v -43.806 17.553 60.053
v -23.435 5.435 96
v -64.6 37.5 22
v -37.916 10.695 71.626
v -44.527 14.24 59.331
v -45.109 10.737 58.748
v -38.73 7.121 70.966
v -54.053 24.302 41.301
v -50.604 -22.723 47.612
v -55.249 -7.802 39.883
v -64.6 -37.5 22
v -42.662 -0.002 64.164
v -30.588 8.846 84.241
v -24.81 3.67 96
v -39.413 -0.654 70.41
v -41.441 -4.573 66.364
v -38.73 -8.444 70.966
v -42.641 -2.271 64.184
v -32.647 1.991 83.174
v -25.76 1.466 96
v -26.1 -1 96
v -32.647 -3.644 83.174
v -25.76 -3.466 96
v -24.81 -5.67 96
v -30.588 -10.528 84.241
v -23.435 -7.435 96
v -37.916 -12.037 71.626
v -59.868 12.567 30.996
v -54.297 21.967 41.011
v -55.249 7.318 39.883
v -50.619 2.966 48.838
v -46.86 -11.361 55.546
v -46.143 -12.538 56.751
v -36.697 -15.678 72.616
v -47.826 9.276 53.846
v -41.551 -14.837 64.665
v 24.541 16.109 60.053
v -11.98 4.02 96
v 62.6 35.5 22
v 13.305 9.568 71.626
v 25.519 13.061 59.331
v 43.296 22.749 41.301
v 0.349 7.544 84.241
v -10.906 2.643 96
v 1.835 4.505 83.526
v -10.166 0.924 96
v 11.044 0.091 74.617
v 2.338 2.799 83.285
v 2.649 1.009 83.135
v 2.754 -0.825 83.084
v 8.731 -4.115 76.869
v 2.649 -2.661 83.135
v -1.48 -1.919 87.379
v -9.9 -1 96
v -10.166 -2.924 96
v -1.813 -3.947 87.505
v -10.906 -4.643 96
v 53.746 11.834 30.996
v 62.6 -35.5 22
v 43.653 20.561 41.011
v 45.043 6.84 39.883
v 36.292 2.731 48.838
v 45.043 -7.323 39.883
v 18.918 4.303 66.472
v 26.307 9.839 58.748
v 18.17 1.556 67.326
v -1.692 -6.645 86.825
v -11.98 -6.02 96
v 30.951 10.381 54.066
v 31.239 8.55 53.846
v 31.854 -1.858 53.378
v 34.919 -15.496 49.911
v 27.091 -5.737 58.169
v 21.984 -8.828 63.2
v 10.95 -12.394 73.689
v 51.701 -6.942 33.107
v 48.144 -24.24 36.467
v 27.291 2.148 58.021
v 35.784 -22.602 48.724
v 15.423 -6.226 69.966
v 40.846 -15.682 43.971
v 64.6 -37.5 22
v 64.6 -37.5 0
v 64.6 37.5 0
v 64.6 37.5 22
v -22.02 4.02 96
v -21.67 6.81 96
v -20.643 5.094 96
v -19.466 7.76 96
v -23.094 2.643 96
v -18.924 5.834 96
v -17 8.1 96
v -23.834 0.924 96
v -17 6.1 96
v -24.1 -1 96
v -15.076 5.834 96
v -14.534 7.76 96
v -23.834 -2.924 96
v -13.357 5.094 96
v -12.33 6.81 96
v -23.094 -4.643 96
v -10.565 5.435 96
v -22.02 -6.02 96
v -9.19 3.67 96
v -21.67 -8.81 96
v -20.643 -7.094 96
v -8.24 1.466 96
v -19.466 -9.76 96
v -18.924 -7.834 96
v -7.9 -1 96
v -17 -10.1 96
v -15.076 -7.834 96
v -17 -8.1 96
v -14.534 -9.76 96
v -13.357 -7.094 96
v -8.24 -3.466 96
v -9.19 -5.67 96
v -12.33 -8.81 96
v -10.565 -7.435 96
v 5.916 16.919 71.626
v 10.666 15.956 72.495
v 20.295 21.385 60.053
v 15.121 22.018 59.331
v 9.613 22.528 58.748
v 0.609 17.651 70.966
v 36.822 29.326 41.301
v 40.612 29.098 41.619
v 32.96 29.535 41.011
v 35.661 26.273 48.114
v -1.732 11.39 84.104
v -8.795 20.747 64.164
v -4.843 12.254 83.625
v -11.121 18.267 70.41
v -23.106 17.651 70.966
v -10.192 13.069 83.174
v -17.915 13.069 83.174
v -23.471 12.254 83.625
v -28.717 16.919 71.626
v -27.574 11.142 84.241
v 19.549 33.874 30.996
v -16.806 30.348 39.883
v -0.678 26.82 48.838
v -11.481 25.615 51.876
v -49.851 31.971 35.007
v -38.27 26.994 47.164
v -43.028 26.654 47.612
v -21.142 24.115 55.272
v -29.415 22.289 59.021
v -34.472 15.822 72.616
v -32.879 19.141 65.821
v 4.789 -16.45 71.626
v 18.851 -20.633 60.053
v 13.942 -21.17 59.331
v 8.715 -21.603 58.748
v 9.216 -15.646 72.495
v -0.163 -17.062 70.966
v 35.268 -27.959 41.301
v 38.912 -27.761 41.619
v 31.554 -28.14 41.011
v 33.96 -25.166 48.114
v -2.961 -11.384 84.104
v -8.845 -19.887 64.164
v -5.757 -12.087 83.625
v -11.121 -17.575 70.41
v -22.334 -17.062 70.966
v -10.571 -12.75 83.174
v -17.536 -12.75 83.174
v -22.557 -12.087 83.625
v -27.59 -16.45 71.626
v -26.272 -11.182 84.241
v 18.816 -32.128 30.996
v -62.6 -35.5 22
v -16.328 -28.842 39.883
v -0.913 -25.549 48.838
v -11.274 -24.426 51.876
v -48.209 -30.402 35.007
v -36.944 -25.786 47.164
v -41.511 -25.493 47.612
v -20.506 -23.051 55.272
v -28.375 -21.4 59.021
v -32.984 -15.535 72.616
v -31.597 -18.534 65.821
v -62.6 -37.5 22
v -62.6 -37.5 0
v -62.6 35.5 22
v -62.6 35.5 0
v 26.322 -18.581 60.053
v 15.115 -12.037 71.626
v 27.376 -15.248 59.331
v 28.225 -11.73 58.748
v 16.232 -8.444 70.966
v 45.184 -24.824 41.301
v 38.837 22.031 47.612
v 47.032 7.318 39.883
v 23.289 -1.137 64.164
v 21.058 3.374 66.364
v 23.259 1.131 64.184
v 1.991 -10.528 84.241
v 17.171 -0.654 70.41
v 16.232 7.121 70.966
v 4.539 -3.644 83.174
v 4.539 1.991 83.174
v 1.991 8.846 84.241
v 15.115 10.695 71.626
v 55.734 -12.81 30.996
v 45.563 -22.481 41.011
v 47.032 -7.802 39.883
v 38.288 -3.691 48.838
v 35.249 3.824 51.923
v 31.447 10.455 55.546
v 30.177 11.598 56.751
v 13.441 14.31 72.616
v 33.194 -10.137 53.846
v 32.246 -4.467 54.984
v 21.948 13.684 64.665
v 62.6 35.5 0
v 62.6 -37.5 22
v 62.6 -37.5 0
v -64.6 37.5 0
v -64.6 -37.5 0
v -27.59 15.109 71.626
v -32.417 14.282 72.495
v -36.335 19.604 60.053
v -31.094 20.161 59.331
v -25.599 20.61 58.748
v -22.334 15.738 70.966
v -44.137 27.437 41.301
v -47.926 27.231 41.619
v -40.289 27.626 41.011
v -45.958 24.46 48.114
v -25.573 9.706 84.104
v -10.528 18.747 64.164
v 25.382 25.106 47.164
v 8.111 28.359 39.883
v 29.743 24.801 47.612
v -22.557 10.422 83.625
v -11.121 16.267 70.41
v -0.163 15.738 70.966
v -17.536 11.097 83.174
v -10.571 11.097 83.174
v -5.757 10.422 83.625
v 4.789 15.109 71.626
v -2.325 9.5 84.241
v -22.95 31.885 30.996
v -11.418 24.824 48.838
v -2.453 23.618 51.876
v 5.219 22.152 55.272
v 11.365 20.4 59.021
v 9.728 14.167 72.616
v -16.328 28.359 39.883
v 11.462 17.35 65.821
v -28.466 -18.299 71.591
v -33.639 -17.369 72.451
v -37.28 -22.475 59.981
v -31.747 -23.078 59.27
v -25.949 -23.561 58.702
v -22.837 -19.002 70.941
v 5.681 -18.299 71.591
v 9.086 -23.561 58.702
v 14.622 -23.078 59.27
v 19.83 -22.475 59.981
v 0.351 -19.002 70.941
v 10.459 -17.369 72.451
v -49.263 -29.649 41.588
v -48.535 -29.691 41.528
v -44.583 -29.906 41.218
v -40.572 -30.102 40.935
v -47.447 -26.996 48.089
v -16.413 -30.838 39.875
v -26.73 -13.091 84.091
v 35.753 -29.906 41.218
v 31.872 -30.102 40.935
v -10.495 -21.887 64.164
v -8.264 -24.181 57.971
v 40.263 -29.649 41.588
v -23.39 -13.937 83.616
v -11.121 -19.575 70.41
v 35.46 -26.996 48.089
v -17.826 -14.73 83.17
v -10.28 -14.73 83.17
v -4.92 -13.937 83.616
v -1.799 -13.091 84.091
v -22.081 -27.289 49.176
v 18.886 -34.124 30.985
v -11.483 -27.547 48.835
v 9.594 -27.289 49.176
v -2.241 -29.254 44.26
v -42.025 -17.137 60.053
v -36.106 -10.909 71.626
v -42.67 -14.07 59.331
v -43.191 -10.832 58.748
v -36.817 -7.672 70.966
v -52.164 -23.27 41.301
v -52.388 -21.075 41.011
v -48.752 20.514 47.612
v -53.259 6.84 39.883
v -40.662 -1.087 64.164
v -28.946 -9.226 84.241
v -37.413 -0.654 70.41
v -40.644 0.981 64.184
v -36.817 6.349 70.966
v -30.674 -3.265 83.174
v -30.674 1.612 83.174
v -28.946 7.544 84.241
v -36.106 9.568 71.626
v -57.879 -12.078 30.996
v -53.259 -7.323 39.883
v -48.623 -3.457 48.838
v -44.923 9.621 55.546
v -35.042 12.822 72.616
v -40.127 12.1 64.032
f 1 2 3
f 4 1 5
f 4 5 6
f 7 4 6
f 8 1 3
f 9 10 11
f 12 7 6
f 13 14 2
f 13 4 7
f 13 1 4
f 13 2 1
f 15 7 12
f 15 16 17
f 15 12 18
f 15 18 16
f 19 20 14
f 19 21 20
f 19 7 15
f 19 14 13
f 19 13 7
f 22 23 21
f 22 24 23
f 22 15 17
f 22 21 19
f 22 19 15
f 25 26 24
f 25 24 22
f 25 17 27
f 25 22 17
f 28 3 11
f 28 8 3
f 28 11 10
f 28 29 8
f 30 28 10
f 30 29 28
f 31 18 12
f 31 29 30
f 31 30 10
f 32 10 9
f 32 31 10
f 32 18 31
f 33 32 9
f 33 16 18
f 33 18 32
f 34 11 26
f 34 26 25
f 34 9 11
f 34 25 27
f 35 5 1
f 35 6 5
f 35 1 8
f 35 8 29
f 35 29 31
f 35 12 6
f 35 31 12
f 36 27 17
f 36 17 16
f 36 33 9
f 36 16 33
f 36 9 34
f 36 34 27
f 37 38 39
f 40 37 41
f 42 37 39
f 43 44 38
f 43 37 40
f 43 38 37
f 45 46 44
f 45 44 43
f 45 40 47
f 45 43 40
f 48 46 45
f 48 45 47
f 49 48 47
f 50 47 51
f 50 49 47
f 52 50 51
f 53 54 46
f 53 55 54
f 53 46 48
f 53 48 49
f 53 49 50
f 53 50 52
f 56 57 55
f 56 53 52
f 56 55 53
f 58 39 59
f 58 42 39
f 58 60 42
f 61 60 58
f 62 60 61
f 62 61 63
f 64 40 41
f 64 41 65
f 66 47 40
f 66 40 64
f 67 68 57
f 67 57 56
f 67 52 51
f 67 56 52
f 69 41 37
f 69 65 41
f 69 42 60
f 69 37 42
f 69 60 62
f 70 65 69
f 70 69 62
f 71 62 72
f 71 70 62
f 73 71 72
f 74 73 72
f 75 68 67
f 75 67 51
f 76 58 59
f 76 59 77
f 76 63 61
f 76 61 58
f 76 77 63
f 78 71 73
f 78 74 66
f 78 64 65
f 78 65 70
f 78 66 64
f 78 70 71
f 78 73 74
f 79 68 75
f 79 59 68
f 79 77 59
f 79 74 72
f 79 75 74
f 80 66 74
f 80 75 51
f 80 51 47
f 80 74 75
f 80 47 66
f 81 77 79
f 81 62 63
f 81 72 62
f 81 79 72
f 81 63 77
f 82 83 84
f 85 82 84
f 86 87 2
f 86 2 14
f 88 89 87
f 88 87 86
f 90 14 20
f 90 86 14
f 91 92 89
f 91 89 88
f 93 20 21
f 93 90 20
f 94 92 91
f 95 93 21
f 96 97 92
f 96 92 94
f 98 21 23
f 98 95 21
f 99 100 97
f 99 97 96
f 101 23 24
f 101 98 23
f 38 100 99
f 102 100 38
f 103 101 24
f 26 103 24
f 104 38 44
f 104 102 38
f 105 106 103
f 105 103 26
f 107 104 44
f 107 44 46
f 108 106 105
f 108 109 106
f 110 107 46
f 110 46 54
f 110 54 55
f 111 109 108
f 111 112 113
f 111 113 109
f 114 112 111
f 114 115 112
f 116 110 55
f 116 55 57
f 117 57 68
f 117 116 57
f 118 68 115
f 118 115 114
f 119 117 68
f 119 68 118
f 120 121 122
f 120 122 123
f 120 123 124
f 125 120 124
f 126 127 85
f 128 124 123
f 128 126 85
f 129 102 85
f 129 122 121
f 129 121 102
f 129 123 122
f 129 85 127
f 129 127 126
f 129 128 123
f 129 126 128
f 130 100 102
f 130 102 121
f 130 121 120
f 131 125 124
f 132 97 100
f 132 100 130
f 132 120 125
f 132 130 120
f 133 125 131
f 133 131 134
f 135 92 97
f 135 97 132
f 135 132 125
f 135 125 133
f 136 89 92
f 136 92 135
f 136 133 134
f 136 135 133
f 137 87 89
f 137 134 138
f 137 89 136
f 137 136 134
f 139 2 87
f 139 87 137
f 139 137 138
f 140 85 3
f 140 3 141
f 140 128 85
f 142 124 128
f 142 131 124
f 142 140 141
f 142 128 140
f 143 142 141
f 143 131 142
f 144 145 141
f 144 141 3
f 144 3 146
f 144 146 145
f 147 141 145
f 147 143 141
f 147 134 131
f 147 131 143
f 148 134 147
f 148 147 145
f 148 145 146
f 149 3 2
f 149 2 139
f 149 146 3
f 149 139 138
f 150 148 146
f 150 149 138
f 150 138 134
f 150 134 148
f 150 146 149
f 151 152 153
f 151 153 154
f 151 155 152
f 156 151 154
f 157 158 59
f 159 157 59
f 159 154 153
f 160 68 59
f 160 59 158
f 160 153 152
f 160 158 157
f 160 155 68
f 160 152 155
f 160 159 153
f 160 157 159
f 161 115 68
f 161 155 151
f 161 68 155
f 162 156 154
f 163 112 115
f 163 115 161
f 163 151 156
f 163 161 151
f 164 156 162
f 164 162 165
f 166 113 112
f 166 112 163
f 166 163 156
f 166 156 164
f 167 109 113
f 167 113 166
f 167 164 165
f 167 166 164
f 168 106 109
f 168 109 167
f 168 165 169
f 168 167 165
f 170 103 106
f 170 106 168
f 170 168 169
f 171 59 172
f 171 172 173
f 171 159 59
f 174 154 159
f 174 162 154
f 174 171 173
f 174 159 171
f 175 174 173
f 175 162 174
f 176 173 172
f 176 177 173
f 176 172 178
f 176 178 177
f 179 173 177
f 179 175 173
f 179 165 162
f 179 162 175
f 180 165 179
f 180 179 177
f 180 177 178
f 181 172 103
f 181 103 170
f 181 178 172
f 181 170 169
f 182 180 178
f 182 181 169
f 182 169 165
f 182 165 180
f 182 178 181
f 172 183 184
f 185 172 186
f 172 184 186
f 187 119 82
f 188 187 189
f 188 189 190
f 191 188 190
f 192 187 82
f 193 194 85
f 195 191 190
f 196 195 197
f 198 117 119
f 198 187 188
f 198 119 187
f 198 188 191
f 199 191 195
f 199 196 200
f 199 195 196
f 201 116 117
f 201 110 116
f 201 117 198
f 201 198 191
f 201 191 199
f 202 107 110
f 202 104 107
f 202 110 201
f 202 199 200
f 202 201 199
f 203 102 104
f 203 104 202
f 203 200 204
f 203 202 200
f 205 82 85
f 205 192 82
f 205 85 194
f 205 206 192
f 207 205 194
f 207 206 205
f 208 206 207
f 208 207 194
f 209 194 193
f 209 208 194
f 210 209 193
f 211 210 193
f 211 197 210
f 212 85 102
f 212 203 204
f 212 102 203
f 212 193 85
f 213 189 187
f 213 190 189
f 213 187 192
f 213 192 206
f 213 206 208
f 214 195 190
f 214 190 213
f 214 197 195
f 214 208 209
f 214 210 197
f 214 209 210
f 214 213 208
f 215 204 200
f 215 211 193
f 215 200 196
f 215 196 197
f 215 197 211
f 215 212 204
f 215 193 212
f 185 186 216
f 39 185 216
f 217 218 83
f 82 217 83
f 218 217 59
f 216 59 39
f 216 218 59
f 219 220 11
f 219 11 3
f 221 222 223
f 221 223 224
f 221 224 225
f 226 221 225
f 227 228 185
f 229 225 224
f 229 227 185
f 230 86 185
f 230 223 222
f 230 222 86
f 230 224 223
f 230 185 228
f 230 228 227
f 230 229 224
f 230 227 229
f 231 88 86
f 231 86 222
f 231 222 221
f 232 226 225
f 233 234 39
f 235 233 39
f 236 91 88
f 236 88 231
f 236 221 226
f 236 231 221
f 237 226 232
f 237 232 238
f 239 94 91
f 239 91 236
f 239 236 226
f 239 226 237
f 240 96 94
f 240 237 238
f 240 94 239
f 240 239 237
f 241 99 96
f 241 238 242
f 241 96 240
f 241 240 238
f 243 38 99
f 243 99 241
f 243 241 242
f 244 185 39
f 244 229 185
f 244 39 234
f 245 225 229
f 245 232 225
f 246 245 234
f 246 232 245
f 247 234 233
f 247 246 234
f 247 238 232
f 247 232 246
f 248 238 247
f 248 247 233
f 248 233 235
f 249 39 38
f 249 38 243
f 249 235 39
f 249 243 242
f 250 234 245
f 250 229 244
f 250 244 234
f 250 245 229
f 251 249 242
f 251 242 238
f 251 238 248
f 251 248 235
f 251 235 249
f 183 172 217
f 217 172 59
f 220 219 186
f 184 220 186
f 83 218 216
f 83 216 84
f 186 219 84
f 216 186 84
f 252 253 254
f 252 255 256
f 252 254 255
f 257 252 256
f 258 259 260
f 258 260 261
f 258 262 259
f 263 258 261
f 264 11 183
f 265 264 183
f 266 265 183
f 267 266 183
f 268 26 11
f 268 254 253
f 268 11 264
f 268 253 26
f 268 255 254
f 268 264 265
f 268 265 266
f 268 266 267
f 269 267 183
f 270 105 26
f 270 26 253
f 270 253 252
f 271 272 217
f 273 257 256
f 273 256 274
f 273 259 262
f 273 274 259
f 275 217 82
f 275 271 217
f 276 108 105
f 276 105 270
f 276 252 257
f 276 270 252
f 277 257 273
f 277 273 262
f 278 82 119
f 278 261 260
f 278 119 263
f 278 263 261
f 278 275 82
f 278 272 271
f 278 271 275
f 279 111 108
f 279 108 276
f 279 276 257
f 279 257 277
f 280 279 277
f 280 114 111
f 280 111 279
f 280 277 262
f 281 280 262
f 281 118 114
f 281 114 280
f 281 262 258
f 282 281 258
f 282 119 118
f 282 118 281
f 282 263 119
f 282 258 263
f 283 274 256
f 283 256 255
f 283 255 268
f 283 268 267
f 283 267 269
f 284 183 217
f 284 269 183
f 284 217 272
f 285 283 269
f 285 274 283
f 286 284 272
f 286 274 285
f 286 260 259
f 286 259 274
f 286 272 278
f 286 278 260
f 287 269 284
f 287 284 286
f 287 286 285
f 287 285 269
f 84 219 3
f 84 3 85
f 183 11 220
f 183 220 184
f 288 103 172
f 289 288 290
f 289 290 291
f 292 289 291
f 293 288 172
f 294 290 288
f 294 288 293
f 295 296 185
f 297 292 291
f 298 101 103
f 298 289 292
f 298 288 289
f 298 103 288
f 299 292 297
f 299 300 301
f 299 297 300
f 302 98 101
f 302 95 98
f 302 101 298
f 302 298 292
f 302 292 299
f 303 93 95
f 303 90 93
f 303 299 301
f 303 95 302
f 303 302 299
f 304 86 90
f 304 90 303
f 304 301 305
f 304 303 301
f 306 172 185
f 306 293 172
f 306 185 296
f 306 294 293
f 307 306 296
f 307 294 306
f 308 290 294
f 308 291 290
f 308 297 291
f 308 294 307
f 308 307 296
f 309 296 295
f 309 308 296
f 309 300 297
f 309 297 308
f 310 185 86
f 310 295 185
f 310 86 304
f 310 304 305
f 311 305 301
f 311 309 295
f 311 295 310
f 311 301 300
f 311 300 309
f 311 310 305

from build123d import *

# Parameters (mm, degrees)
SKETCH_1_W          = 129.2
SKETCH_1_H          = 75
SKETCH_1_W_2        = 125.2
SKETCH_1_H_2        = 71
EXTRUDE_1_DEPTH     = 22
SKETCH_11_W         = 125.2
SKETCH_11_H         = 22
CUT_EXTRUDE_1_DEPTH = 10


with BuildPart() as part:
    # 草图1 → 凸台-拉伸1 (new body)
    with BuildSketch(Plane.XY):
        Rectangle(SKETCH_1_W, SKETCH_1_H)
        Rectangle(SKETCH_1_W_2, SKETCH_1_H_2, mode=Mode.SUBTRACT)
    extrude(amount=EXTRUDE_1_DEPTH)

    # 草图2 → 放样1 section 0
    with BuildSketch(Plane.XY.offset(22)):
        with BuildLine():
            Line((-64.6, 37.5), (-62.6, 35.5))
            Line((-62.6, 35.5), (62.6, 35.5))
            Line((62.6, 35.5), (64.6, 37.5))
            Line((64.6, 37.5), (-64.6, 37.5))
        make_face()
    # 草图6 for 放样1 → 放样1 section 1
    with BuildSketch(Plane.XY.offset(96)):
        with BuildLine():
            Line((-22.020458146, 4.020458146), (-23.434671709, 5.434671709))
            # circular arc as an exact rational Bezier (weights 1, cos(half-angle), 1)
            Bezier((-23.434671709, 5.434671709), (-17, 11.869343418), (-10.565328291, 5.434671709), weights=[1, 0.707106781, 1])
            Line((-10.565328291, 5.434671709), (-11.979541854, 4.020458146))
            Bezier((-11.979541854, 4.020458146), (-17, 9.040916293), (-22.020458146, 4.020458146), weights=[1, 0.707106781, 1])
        make_face()
    loft()

    # 草图3 → 放样2 section 0
    with BuildSketch(Plane.XY.offset(22)):
        with BuildLine():
            Line((-62.6, 35.5), (-64.6, 37.5))
            Line((-64.6, 37.5), (-64.6, -37.5))
            Line((-64.6, -37.5), (-62.6, -35.5))
            Line((-62.6, -35.5), (-62.6, 35.5))
        make_face()
    # 草图7 for 放样2 → 放样2 section 1
    with BuildSketch(Plane.XY.offset(96)):
        with BuildLine():
            Line((-22.020458146, 4.020458146), (-23.434671709, 5.434671709))
            Bezier((-23.434671709, 5.434671709), (-29.869343418, -1), (-23.434671709, -7.434671709), weights=[1, 0.707106781, 1])
            Line((-23.434671709, -7.434671709), (-22.020458146, -6.020458146))
            Bezier((-22.020458146, -6.020458146), (-27.040916293, -1), (-22.020458146, 4.020458146), weights=[1, 0.707106781, 1])
        make_face()
    loft()

    # 草图4 → 放样3 section 0
    with BuildSketch(Plane.XY.offset(22)):
        with BuildLine():
            Line((-62.6, -35.5), (-64.6, -37.5))
            Line((-64.6, -37.5), (64.6, -37.5))
            Line((64.6, -37.5), (62.6, -35.5))
            Line((62.6, -35.5), (-62.6, -35.5))
        make_face()
    # 草图8 for 放样3 → 放样3 section 1
    with BuildSketch(Plane.XY.offset(96)):
        with BuildLine():
            Line((-22.020458146, -6.020458146), (-23.434671709, -7.434671709))
            Bezier((-23.434671709, -7.434671709), (-17, -13.869343418), (-10.565328291, -7.434671709), weights=[1, 0.707106781, 1])
            Line((-10.565328291, -7.434671709), (-11.979541854, -6.020458146))
            Bezier((-11.979541854, -6.020458146), (-17, -11.040916293), (-22.020458146, -6.020458146), weights=[1, 0.707106781, 1])
        make_face()
    loft()

    # 草图5 → 放样4 section 0
    with BuildSketch(Plane.XY.offset(22)):
        with BuildLine():
            Line((64.6, 37.5), (62.6, 35.5))
            Line((62.6, 35.5), (62.6, -35.5))
            Line((62.6, -35.5), (64.6, -37.5))
            Line((64.6, -37.5), (64.6, 37.5))
        make_face()
    # 草图9 for 放样4 → 放样4 section 1
    with BuildSketch(Plane.XY.offset(96)):
        with BuildLine():
            Line((-10.565328291, 5.434671709), (-11.979541854, 4.020458146))
            Bezier((-11.979541854, 4.020458146), (-6.959083707, -1), (-11.979541854, -6.020458146), weights=[1, 0.707106781, 1])
            Line((-11.979541854, -6.020458146), (-10.565328291, -7.434671709))
            Bezier((-10.565328291, -7.434671709), (-4.130656582, -1), (-10.565328291, 5.434671709), weights=[1, 0.707106781, 1])
        make_face()
    loft()

    # 草图11 → 切除-拉伸1 (cut)
    with BuildSketch(Plane(origin=(0, -35.5, 0), x_dir=(1, 0, 0), z_dir=(0, 1, 0))):
        with Locations((0, -11)):
            Rectangle(SKETCH_11_W, SKETCH_11_H)
    extrude(amount=-CUT_EXTRUDE_1_DEPTH, mode=Mode.SUBTRACT)


solid = part.part
